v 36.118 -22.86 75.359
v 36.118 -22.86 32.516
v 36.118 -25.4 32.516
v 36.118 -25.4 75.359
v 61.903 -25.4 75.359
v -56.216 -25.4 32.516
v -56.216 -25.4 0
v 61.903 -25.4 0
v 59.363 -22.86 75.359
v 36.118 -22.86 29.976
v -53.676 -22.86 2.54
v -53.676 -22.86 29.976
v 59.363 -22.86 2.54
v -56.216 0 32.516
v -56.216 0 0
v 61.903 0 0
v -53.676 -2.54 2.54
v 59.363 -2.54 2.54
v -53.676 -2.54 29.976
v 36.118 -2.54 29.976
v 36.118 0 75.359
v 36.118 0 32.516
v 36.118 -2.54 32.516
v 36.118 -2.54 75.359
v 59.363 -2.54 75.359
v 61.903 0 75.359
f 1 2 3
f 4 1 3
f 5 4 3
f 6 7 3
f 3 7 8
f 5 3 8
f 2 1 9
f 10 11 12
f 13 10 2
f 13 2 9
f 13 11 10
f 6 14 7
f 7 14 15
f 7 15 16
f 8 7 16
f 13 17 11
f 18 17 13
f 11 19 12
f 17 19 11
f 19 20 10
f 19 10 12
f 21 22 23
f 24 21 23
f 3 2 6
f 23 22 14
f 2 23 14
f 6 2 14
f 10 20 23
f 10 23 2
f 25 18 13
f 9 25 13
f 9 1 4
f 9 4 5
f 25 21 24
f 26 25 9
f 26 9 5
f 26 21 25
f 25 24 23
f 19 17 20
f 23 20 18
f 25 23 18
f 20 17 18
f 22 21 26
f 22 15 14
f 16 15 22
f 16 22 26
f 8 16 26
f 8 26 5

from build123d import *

# Parameters (mm, degrees)
F0_W     = 25.7852114737
F0_H     = 17.4429379404
F1_DEPTH = 25.4
F2_DEPTH = 25.4
F3_T     = 2.54


# Not quite as in the source:
# - a shell that OpenCascade refuses in one call is made with other operations: the cavity is built on its own and cut out


with BuildPart() as f1:
    # F0 (on Front) → F1 (new body)
    with BuildSketch(Plane.XZ):
        Polygon((36.1182577908, 32.5159132481), (-56.2155582011, 32.5159132481), (-56.2155582011, 0), (61.9034692645, 0), (61.9034692645, 32.5159132481), align=None)
        with Locations((49.0108635277, 41.2373822182)):
            Rectangle(F0_W, F0_H)
    extrude(amount=F1_DEPTH)

    # F2 (add): a face of the model
    f2_faces = [f1.faces().sort_by_distance(p)[0] for p in [
        (49.0108635277, -12.7, 49.9588511884),
    ]]
    extrude(f2_faces, amount=F2_DEPTH)

    # F3: shell of thickness 2.54, made by hand


with BuildPart() as f3_core1:
    # F3_t2: copy of F1
    add(f1.part)

    # the walls: a layer under each face that stays
    f3_faces = [f3_core1.faces().sort_by_distance(p)[0] for p in [
        (-10.0486502051, -12.7, 32.5159132481),
        (-36.5290536235, -25.4, 12.5598085314),
        (61.9034692645, -12.7, 37.6794255942),
        (2.8439555317, -12.7, 0),
        (-36.5290536235, 0, 12.5598085314),
        (-56.2155582011, -12.7, 16.257956624),
    ]]
    thicken(f3_faces, amount=-F3_T, mode=Mode.SUBTRACT)


with BuildPart() as f1_1:
    add(f1.part)

    # what is left inside the walls is the cavity
    f3_cavity = [f3_core1.part.solids().sort_by_distance(p)[0] for p in [
        (2.843956, -2.5654, 26.81295),
    ]]
    add(f3_cavity, mode=Mode.SUBTRACT)


solid = f1_1.part
